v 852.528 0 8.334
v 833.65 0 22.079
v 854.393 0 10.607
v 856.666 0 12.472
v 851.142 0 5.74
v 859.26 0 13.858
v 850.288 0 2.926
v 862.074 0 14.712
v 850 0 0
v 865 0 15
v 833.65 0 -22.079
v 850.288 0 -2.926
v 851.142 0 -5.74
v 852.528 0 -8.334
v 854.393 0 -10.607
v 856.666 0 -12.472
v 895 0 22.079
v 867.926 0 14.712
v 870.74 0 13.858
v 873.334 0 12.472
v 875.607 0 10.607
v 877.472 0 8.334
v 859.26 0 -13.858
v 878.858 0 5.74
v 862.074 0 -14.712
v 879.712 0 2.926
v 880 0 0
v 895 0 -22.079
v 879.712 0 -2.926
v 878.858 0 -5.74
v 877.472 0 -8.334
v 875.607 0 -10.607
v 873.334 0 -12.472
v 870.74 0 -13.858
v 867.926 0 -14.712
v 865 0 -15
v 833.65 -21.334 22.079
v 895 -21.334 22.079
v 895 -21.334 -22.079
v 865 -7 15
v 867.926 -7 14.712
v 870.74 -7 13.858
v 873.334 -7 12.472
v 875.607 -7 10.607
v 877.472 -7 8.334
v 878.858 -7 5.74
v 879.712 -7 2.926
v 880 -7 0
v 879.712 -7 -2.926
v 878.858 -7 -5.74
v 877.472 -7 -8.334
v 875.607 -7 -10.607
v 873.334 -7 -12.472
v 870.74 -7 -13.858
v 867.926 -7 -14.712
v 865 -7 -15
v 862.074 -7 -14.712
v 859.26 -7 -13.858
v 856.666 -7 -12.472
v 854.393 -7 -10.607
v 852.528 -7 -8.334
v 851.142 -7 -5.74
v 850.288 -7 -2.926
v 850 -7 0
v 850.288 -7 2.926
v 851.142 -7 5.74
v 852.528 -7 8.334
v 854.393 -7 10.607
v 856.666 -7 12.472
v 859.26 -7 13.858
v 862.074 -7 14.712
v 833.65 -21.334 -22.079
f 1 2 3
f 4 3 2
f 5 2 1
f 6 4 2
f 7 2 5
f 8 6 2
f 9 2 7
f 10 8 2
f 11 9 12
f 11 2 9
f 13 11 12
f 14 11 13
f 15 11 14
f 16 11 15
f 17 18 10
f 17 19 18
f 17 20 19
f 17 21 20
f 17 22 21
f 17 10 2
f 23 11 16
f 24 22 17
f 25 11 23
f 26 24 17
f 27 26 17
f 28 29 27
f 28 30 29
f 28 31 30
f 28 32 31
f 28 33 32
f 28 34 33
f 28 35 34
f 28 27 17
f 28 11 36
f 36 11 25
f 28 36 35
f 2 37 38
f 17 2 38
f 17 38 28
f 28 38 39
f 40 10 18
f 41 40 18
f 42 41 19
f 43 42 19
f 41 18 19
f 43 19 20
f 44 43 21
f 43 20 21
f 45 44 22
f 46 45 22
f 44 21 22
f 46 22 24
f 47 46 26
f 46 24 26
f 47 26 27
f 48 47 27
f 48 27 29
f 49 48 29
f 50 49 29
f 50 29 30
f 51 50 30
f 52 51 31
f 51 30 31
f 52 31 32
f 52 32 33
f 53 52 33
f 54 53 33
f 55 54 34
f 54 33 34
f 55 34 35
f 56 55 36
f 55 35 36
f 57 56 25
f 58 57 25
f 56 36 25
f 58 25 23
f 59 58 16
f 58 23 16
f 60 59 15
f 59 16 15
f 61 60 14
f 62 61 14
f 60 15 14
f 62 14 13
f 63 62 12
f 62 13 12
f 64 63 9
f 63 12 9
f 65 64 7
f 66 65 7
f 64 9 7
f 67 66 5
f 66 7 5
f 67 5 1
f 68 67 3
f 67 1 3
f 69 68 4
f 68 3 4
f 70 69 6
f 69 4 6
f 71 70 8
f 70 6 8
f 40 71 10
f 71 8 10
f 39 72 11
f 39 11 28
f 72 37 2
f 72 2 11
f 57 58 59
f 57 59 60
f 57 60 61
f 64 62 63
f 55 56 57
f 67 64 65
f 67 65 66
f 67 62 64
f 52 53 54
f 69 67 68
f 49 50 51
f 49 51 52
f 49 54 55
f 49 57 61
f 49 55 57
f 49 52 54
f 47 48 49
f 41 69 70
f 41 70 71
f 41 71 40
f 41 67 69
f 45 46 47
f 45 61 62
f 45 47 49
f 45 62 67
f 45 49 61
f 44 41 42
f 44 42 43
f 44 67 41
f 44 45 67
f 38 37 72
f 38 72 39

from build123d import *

# Parameters (mm, degrees)
CUT_EXTRUDE7_DEPTH               = 1010.950493836
CUT_EXTRUDE7_DEPTH_BACK          = 1010.950493836
SKETCH13_W                       = 48.176434887
SKETCH13_H                       = 155.804640487
SKETCH4_W                        = 600
SKETCH4_H                        = 44.158972604
CUT_EXTRUDE2_DEPTH               = 1010.950493836
SKETCH7_W                        = 159.807953253
SKETCH7_H                        = 69.49104999
BOSS_EXTRUDE7_DEPTH              = 5
FILLET5_R                        = 10
F_5_8_0_625_DIAMETER_HOLE1_D     = 15.875
F_5_8_0_625_DIAMETER_HOLE1_DEPTH = 30
F_5_8_0_625_DIAMETER_HOLE1_TIP   = 4.769331164
BOSS_EXTRUDE8_DEPTH              = 10
BOSS_EXTRUDE8_DEPTH_BACK         = 10
SKETCH16_W                       = 57.403477863
SKETCH16_H                       = 23.203595883
SKETCH17_W                       = 38.256761469
SKETCH17_H                       = 12.64819079
BOSS_EXTRUDE9_DEPTH              = 10
SKETCH18_W                       = 120
SKETCH18_H                       = 104.74536306
CUT_EXTRUDE8_DEPTH               = 161
FILLET6_R                        = 10
SKETCH19_R                       = 15
CUT_EXTRUDE9_DEPTH               = 7
CUT_EXTRUDE11_DEPTH              = 1010.950493856
CUT_EXTRUDE11_DEPTH_BACK         = 1010.950493856
SKETCH22_W                       = 1481.455902665
SKETCH22_H                       = 524.99926461
SKETCH22_W_2                     = 774.615564444
SKETCH22_H_2                     = 130
SKETCH23_W                       = 1033.221047575
SKETCH23_H                       = 313.410359552
SKETCH23_W_2                     = 790.959514037
SKETCH23_H_2                     = 163.499719248
CUT_EXTRUDE12_DEPTH              = 915.822387207
CUT_EXTRUDE13_DEPTH              = 908.868382599
CUT_EXTRUDE13_DEPTH_BACK         = 908.868382599
SKETCH24_W                       = 774.615564444
SKETCH24_H                       = 42.920513698
CUT_EXTRUDE14_DEPTH              = 908.868382607
CUT_EXTRUDE14_DEPTH_BACK         = 908.868382607
SKETCH25_W                       = 913.785959768
SKETCH25_H                       = 329.26502352
SKETCH25_W_2                     = 61.349903791
SKETCH25_H_2                     = 44.158972604


# Read off the part's stored shape, not the designer's step: Revolve1
with BuildPart() as part:
    # Revolve1 outline → Revolve1 (revolve)
    with BuildSketch(Plane.YX):
        with BuildLine():
            Line((0, 1000), (0, 0))
            ThreePointArc((0, 0), (70.710678154, 29.289321917), (100, 100.0000001))
            Line((100, 100.0000001), (100, 899.9999999))
            ThreePointArc((100, 899.9999999), (70.710678154, 970.710678083), (0, 1000))
        make_face()
    revolve(axis=Axis((0, 0, 0), (1, 0, 0)))

    # Sketch13 → Cut-Extrude7 (cut, two sides: drawn at the far end of the back side and taken through both)
    with BuildSketch(Plane(origin=(0, 0, 0), x_dir=(1, 0, 0), z_dir=(0, 1, 0)).offset(-CUT_EXTRUDE7_DEPTH_BACK)):
        with Locations((5.911782557, -3.075091589)):
            Rectangle(SKETCH13_W, SKETCH13_H)
    extrude(amount=CUT_EXTRUDE7_DEPTH + CUT_EXTRUDE7_DEPTH_BACK, mode=Mode.SUBTRACT)

    # Sketch4 → Cut-Extrude2 (cut, through all)
    with BuildSketch(Plane(origin=(0, 0, 0), x_dir=(1, 0, 0), z_dir=(0, 1, 0))):
        with Locations((595, 0)):
            Rectangle(SKETCH4_W, SKETCH4_H)
    extrude(amount=CUT_EXTRUDE2_DEPTH, mode=Mode.SUBTRACT)

    # Sketch7 → Boss-Extrude7 (add)
    with BuildSketch(Plane(origin=(0, 0, 0), x_dir=(1, 0, 0), z_dir=(0, 1, 0))):
        with Locations((745.885521462, -1.405844332)):
            Rectangle(SKETCH7_W, SKETCH7_H)
    extrude(amount=-BOSS_EXTRUDE7_DEPTH)

    # Fillet5
    fillet5_edges = [part.edges().sort_by_distance(p)[0] for p in [
        (30, -71.414284286, 0),
    ]]
    fillet(fillet5_edges, radius=FILLET5_R)

    # 5/8 (0.625) Diameter Hole1
    with Locations(Plane.ZY.offset(-30)):
        with Locations((0, 0)):
            Hole(F_5_8_0_625_DIAMETER_HOLE1_D / 2, depth=F_5_8_0_625_DIAMETER_HOLE1_DEPTH)
            with Locations((0, 0, -(F_5_8_0_625_DIAMETER_HOLE1_DEPTH + F_5_8_0_625_DIAMETER_HOLE1_TIP / 2))):  # 118° drill point
                Cone(0, F_5_8_0_625_DIAMETER_HOLE1_D / 2, F_5_8_0_625_DIAMETER_HOLE1_TIP, mode=Mode.SUBTRACT)

    # Sketch16 → Boss-Extrude8 (add, two sides: drawn at the far end of the back side and taken through both)
    with BuildSketch(Plane.XY.offset(-BOSS_EXTRUDE8_DEPTH_BACK)):
        with Locations((738.294537666, -11.601797942)):
            Rectangle(SKETCH16_W, SKETCH16_H)
    extrude(amount=BOSS_EXTRUDE8_DEPTH + BOSS_EXTRUDE8_DEPTH_BACK)

    # Sketch17 → Boss-Extrude9 (add)
    with BuildSketch(Plane.XY.offset(-22.079486302)):
        with Locations((787.071835847, 6.324095395)):
            Rectangle(SKETCH17_W, SKETCH17_H)
    extrude(amount=-BOSS_EXTRUDE9_DEPTH)

    # Sketch18 → Cut-Extrude8 (cut)
    with BuildSketch(Plane(origin=(0, 0, 0), x_dir=(1, 0, 0), z_dir=(0, 1, 0))):
        with Locations((204.992275313, 0)):
            Rectangle(SKETCH18_W, SKETCH18_H)
    extrude(amount=CUT_EXTRUDE8_DEPTH, mode=Mode.SUBTRACT)

    # Fillet6
    fillet6_edges = [part.edges().sort_by_distance(p)[0] for p in [
        (144.992275313, 42.594313674, -52.37268153),
        (144.992275313, 42.594313674, 52.37268153),
        (264.992275313, 42.594313674, 52.37268153),
        (264.992275313, 42.594313674, -52.37268153),
    ]]
    fillet(fillet6_edges, radius=FILLET6_R)

    # Sketch19 → Cut-Extrude9 (cut)
    with BuildSketch(Plane(origin=(0, 0, 0), x_dir=(1, 0, 0), z_dir=(0, 1, 0))):
        with Locations(Location((865, 0, 0), (0, 0, 270))):
            Circle(SKETCH19_R)
    extrude(amount=-CUT_EXTRUDE9_DEPTH, mode=Mode.SUBTRACT)

    # Sketch22 → Cut-Extrude11 (cut, two sides: drawn at the far end of the back side and taken through both)
    with BuildSketch(Plane(origin=(0, 0, 0), x_dir=(1, 0, 0), z_dir=(0, 1, 0)).offset(-CUT_EXTRUDE11_DEPTH_BACK)):
        with Locations((406.155110175, 0)):
            Rectangle(SKETCH22_W, SKETCH22_H)
        with Locations((512.692217778, 0)):
            Rectangle(SKETCH22_W_2, SKETCH22_H_2, mode=Mode.SUBTRACT)
    extrude(amount=CUT_EXTRUDE11_DEPTH + CUT_EXTRUDE11_DEPTH_BACK, mode=Mode.SUBTRACT)

    # Sketch23 → Cut-Extrude12 (cut, through all)
    with BuildSketch(Plane.XY.offset(65)):
        with Locations((481.89787613, -1.932796335)):
            Rectangle(SKETCH23_W, SKETCH23_H)
        with Locations((520.864192575, 60.415600646)):
            Rectangle(SKETCH23_W_2, SKETCH23_H_2, mode=Mode.SUBTRACT)
    extrude(amount=-CUT_EXTRUDE12_DEPTH, mode=Mode.SUBTRACT)

    # Sketch24 → Cut-Extrude13 (cut, two sides: drawn at the far end of the back side and taken through both)
    with BuildSketch(Plane(origin=(0, 0, 0), x_dir=(1, 0, 0), z_dir=(0, 1, 0)).offset(-CUT_EXTRUDE13_DEPTH_BACK)):
        with Locations((512.692217778, -43.539743151)):
            Rectangle(SKETCH24_W, SKETCH24_H)
    extrude(amount=CUT_EXTRUDE13_DEPTH + CUT_EXTRUDE13_DEPTH_BACK, mode=Mode.SUBTRACT)

    # Sketch25 → Cut-Extrude14 (cut, two sides: drawn at the far end of the back side and taken through both)
    with BuildSketch(Plane(origin=(0, 0, 0), x_dir=(1, 0, 0), z_dir=(0, 1, 0)).offset(-CUT_EXTRUDE14_DEPTH_BACK)):
        with Locations((557.248723254, -2.517184657)):
            Rectangle(SKETCH25_W, SKETCH25_H)
        with Locations((864.325048104, 0)):
            Rectangle(SKETCH25_W_2, SKETCH25_H_2, mode=Mode.SUBTRACT)
    extrude(amount=CUT_EXTRUDE14_DEPTH + CUT_EXTRUDE14_DEPTH_BACK, mode=Mode.SUBTRACT)


solid = part.part
